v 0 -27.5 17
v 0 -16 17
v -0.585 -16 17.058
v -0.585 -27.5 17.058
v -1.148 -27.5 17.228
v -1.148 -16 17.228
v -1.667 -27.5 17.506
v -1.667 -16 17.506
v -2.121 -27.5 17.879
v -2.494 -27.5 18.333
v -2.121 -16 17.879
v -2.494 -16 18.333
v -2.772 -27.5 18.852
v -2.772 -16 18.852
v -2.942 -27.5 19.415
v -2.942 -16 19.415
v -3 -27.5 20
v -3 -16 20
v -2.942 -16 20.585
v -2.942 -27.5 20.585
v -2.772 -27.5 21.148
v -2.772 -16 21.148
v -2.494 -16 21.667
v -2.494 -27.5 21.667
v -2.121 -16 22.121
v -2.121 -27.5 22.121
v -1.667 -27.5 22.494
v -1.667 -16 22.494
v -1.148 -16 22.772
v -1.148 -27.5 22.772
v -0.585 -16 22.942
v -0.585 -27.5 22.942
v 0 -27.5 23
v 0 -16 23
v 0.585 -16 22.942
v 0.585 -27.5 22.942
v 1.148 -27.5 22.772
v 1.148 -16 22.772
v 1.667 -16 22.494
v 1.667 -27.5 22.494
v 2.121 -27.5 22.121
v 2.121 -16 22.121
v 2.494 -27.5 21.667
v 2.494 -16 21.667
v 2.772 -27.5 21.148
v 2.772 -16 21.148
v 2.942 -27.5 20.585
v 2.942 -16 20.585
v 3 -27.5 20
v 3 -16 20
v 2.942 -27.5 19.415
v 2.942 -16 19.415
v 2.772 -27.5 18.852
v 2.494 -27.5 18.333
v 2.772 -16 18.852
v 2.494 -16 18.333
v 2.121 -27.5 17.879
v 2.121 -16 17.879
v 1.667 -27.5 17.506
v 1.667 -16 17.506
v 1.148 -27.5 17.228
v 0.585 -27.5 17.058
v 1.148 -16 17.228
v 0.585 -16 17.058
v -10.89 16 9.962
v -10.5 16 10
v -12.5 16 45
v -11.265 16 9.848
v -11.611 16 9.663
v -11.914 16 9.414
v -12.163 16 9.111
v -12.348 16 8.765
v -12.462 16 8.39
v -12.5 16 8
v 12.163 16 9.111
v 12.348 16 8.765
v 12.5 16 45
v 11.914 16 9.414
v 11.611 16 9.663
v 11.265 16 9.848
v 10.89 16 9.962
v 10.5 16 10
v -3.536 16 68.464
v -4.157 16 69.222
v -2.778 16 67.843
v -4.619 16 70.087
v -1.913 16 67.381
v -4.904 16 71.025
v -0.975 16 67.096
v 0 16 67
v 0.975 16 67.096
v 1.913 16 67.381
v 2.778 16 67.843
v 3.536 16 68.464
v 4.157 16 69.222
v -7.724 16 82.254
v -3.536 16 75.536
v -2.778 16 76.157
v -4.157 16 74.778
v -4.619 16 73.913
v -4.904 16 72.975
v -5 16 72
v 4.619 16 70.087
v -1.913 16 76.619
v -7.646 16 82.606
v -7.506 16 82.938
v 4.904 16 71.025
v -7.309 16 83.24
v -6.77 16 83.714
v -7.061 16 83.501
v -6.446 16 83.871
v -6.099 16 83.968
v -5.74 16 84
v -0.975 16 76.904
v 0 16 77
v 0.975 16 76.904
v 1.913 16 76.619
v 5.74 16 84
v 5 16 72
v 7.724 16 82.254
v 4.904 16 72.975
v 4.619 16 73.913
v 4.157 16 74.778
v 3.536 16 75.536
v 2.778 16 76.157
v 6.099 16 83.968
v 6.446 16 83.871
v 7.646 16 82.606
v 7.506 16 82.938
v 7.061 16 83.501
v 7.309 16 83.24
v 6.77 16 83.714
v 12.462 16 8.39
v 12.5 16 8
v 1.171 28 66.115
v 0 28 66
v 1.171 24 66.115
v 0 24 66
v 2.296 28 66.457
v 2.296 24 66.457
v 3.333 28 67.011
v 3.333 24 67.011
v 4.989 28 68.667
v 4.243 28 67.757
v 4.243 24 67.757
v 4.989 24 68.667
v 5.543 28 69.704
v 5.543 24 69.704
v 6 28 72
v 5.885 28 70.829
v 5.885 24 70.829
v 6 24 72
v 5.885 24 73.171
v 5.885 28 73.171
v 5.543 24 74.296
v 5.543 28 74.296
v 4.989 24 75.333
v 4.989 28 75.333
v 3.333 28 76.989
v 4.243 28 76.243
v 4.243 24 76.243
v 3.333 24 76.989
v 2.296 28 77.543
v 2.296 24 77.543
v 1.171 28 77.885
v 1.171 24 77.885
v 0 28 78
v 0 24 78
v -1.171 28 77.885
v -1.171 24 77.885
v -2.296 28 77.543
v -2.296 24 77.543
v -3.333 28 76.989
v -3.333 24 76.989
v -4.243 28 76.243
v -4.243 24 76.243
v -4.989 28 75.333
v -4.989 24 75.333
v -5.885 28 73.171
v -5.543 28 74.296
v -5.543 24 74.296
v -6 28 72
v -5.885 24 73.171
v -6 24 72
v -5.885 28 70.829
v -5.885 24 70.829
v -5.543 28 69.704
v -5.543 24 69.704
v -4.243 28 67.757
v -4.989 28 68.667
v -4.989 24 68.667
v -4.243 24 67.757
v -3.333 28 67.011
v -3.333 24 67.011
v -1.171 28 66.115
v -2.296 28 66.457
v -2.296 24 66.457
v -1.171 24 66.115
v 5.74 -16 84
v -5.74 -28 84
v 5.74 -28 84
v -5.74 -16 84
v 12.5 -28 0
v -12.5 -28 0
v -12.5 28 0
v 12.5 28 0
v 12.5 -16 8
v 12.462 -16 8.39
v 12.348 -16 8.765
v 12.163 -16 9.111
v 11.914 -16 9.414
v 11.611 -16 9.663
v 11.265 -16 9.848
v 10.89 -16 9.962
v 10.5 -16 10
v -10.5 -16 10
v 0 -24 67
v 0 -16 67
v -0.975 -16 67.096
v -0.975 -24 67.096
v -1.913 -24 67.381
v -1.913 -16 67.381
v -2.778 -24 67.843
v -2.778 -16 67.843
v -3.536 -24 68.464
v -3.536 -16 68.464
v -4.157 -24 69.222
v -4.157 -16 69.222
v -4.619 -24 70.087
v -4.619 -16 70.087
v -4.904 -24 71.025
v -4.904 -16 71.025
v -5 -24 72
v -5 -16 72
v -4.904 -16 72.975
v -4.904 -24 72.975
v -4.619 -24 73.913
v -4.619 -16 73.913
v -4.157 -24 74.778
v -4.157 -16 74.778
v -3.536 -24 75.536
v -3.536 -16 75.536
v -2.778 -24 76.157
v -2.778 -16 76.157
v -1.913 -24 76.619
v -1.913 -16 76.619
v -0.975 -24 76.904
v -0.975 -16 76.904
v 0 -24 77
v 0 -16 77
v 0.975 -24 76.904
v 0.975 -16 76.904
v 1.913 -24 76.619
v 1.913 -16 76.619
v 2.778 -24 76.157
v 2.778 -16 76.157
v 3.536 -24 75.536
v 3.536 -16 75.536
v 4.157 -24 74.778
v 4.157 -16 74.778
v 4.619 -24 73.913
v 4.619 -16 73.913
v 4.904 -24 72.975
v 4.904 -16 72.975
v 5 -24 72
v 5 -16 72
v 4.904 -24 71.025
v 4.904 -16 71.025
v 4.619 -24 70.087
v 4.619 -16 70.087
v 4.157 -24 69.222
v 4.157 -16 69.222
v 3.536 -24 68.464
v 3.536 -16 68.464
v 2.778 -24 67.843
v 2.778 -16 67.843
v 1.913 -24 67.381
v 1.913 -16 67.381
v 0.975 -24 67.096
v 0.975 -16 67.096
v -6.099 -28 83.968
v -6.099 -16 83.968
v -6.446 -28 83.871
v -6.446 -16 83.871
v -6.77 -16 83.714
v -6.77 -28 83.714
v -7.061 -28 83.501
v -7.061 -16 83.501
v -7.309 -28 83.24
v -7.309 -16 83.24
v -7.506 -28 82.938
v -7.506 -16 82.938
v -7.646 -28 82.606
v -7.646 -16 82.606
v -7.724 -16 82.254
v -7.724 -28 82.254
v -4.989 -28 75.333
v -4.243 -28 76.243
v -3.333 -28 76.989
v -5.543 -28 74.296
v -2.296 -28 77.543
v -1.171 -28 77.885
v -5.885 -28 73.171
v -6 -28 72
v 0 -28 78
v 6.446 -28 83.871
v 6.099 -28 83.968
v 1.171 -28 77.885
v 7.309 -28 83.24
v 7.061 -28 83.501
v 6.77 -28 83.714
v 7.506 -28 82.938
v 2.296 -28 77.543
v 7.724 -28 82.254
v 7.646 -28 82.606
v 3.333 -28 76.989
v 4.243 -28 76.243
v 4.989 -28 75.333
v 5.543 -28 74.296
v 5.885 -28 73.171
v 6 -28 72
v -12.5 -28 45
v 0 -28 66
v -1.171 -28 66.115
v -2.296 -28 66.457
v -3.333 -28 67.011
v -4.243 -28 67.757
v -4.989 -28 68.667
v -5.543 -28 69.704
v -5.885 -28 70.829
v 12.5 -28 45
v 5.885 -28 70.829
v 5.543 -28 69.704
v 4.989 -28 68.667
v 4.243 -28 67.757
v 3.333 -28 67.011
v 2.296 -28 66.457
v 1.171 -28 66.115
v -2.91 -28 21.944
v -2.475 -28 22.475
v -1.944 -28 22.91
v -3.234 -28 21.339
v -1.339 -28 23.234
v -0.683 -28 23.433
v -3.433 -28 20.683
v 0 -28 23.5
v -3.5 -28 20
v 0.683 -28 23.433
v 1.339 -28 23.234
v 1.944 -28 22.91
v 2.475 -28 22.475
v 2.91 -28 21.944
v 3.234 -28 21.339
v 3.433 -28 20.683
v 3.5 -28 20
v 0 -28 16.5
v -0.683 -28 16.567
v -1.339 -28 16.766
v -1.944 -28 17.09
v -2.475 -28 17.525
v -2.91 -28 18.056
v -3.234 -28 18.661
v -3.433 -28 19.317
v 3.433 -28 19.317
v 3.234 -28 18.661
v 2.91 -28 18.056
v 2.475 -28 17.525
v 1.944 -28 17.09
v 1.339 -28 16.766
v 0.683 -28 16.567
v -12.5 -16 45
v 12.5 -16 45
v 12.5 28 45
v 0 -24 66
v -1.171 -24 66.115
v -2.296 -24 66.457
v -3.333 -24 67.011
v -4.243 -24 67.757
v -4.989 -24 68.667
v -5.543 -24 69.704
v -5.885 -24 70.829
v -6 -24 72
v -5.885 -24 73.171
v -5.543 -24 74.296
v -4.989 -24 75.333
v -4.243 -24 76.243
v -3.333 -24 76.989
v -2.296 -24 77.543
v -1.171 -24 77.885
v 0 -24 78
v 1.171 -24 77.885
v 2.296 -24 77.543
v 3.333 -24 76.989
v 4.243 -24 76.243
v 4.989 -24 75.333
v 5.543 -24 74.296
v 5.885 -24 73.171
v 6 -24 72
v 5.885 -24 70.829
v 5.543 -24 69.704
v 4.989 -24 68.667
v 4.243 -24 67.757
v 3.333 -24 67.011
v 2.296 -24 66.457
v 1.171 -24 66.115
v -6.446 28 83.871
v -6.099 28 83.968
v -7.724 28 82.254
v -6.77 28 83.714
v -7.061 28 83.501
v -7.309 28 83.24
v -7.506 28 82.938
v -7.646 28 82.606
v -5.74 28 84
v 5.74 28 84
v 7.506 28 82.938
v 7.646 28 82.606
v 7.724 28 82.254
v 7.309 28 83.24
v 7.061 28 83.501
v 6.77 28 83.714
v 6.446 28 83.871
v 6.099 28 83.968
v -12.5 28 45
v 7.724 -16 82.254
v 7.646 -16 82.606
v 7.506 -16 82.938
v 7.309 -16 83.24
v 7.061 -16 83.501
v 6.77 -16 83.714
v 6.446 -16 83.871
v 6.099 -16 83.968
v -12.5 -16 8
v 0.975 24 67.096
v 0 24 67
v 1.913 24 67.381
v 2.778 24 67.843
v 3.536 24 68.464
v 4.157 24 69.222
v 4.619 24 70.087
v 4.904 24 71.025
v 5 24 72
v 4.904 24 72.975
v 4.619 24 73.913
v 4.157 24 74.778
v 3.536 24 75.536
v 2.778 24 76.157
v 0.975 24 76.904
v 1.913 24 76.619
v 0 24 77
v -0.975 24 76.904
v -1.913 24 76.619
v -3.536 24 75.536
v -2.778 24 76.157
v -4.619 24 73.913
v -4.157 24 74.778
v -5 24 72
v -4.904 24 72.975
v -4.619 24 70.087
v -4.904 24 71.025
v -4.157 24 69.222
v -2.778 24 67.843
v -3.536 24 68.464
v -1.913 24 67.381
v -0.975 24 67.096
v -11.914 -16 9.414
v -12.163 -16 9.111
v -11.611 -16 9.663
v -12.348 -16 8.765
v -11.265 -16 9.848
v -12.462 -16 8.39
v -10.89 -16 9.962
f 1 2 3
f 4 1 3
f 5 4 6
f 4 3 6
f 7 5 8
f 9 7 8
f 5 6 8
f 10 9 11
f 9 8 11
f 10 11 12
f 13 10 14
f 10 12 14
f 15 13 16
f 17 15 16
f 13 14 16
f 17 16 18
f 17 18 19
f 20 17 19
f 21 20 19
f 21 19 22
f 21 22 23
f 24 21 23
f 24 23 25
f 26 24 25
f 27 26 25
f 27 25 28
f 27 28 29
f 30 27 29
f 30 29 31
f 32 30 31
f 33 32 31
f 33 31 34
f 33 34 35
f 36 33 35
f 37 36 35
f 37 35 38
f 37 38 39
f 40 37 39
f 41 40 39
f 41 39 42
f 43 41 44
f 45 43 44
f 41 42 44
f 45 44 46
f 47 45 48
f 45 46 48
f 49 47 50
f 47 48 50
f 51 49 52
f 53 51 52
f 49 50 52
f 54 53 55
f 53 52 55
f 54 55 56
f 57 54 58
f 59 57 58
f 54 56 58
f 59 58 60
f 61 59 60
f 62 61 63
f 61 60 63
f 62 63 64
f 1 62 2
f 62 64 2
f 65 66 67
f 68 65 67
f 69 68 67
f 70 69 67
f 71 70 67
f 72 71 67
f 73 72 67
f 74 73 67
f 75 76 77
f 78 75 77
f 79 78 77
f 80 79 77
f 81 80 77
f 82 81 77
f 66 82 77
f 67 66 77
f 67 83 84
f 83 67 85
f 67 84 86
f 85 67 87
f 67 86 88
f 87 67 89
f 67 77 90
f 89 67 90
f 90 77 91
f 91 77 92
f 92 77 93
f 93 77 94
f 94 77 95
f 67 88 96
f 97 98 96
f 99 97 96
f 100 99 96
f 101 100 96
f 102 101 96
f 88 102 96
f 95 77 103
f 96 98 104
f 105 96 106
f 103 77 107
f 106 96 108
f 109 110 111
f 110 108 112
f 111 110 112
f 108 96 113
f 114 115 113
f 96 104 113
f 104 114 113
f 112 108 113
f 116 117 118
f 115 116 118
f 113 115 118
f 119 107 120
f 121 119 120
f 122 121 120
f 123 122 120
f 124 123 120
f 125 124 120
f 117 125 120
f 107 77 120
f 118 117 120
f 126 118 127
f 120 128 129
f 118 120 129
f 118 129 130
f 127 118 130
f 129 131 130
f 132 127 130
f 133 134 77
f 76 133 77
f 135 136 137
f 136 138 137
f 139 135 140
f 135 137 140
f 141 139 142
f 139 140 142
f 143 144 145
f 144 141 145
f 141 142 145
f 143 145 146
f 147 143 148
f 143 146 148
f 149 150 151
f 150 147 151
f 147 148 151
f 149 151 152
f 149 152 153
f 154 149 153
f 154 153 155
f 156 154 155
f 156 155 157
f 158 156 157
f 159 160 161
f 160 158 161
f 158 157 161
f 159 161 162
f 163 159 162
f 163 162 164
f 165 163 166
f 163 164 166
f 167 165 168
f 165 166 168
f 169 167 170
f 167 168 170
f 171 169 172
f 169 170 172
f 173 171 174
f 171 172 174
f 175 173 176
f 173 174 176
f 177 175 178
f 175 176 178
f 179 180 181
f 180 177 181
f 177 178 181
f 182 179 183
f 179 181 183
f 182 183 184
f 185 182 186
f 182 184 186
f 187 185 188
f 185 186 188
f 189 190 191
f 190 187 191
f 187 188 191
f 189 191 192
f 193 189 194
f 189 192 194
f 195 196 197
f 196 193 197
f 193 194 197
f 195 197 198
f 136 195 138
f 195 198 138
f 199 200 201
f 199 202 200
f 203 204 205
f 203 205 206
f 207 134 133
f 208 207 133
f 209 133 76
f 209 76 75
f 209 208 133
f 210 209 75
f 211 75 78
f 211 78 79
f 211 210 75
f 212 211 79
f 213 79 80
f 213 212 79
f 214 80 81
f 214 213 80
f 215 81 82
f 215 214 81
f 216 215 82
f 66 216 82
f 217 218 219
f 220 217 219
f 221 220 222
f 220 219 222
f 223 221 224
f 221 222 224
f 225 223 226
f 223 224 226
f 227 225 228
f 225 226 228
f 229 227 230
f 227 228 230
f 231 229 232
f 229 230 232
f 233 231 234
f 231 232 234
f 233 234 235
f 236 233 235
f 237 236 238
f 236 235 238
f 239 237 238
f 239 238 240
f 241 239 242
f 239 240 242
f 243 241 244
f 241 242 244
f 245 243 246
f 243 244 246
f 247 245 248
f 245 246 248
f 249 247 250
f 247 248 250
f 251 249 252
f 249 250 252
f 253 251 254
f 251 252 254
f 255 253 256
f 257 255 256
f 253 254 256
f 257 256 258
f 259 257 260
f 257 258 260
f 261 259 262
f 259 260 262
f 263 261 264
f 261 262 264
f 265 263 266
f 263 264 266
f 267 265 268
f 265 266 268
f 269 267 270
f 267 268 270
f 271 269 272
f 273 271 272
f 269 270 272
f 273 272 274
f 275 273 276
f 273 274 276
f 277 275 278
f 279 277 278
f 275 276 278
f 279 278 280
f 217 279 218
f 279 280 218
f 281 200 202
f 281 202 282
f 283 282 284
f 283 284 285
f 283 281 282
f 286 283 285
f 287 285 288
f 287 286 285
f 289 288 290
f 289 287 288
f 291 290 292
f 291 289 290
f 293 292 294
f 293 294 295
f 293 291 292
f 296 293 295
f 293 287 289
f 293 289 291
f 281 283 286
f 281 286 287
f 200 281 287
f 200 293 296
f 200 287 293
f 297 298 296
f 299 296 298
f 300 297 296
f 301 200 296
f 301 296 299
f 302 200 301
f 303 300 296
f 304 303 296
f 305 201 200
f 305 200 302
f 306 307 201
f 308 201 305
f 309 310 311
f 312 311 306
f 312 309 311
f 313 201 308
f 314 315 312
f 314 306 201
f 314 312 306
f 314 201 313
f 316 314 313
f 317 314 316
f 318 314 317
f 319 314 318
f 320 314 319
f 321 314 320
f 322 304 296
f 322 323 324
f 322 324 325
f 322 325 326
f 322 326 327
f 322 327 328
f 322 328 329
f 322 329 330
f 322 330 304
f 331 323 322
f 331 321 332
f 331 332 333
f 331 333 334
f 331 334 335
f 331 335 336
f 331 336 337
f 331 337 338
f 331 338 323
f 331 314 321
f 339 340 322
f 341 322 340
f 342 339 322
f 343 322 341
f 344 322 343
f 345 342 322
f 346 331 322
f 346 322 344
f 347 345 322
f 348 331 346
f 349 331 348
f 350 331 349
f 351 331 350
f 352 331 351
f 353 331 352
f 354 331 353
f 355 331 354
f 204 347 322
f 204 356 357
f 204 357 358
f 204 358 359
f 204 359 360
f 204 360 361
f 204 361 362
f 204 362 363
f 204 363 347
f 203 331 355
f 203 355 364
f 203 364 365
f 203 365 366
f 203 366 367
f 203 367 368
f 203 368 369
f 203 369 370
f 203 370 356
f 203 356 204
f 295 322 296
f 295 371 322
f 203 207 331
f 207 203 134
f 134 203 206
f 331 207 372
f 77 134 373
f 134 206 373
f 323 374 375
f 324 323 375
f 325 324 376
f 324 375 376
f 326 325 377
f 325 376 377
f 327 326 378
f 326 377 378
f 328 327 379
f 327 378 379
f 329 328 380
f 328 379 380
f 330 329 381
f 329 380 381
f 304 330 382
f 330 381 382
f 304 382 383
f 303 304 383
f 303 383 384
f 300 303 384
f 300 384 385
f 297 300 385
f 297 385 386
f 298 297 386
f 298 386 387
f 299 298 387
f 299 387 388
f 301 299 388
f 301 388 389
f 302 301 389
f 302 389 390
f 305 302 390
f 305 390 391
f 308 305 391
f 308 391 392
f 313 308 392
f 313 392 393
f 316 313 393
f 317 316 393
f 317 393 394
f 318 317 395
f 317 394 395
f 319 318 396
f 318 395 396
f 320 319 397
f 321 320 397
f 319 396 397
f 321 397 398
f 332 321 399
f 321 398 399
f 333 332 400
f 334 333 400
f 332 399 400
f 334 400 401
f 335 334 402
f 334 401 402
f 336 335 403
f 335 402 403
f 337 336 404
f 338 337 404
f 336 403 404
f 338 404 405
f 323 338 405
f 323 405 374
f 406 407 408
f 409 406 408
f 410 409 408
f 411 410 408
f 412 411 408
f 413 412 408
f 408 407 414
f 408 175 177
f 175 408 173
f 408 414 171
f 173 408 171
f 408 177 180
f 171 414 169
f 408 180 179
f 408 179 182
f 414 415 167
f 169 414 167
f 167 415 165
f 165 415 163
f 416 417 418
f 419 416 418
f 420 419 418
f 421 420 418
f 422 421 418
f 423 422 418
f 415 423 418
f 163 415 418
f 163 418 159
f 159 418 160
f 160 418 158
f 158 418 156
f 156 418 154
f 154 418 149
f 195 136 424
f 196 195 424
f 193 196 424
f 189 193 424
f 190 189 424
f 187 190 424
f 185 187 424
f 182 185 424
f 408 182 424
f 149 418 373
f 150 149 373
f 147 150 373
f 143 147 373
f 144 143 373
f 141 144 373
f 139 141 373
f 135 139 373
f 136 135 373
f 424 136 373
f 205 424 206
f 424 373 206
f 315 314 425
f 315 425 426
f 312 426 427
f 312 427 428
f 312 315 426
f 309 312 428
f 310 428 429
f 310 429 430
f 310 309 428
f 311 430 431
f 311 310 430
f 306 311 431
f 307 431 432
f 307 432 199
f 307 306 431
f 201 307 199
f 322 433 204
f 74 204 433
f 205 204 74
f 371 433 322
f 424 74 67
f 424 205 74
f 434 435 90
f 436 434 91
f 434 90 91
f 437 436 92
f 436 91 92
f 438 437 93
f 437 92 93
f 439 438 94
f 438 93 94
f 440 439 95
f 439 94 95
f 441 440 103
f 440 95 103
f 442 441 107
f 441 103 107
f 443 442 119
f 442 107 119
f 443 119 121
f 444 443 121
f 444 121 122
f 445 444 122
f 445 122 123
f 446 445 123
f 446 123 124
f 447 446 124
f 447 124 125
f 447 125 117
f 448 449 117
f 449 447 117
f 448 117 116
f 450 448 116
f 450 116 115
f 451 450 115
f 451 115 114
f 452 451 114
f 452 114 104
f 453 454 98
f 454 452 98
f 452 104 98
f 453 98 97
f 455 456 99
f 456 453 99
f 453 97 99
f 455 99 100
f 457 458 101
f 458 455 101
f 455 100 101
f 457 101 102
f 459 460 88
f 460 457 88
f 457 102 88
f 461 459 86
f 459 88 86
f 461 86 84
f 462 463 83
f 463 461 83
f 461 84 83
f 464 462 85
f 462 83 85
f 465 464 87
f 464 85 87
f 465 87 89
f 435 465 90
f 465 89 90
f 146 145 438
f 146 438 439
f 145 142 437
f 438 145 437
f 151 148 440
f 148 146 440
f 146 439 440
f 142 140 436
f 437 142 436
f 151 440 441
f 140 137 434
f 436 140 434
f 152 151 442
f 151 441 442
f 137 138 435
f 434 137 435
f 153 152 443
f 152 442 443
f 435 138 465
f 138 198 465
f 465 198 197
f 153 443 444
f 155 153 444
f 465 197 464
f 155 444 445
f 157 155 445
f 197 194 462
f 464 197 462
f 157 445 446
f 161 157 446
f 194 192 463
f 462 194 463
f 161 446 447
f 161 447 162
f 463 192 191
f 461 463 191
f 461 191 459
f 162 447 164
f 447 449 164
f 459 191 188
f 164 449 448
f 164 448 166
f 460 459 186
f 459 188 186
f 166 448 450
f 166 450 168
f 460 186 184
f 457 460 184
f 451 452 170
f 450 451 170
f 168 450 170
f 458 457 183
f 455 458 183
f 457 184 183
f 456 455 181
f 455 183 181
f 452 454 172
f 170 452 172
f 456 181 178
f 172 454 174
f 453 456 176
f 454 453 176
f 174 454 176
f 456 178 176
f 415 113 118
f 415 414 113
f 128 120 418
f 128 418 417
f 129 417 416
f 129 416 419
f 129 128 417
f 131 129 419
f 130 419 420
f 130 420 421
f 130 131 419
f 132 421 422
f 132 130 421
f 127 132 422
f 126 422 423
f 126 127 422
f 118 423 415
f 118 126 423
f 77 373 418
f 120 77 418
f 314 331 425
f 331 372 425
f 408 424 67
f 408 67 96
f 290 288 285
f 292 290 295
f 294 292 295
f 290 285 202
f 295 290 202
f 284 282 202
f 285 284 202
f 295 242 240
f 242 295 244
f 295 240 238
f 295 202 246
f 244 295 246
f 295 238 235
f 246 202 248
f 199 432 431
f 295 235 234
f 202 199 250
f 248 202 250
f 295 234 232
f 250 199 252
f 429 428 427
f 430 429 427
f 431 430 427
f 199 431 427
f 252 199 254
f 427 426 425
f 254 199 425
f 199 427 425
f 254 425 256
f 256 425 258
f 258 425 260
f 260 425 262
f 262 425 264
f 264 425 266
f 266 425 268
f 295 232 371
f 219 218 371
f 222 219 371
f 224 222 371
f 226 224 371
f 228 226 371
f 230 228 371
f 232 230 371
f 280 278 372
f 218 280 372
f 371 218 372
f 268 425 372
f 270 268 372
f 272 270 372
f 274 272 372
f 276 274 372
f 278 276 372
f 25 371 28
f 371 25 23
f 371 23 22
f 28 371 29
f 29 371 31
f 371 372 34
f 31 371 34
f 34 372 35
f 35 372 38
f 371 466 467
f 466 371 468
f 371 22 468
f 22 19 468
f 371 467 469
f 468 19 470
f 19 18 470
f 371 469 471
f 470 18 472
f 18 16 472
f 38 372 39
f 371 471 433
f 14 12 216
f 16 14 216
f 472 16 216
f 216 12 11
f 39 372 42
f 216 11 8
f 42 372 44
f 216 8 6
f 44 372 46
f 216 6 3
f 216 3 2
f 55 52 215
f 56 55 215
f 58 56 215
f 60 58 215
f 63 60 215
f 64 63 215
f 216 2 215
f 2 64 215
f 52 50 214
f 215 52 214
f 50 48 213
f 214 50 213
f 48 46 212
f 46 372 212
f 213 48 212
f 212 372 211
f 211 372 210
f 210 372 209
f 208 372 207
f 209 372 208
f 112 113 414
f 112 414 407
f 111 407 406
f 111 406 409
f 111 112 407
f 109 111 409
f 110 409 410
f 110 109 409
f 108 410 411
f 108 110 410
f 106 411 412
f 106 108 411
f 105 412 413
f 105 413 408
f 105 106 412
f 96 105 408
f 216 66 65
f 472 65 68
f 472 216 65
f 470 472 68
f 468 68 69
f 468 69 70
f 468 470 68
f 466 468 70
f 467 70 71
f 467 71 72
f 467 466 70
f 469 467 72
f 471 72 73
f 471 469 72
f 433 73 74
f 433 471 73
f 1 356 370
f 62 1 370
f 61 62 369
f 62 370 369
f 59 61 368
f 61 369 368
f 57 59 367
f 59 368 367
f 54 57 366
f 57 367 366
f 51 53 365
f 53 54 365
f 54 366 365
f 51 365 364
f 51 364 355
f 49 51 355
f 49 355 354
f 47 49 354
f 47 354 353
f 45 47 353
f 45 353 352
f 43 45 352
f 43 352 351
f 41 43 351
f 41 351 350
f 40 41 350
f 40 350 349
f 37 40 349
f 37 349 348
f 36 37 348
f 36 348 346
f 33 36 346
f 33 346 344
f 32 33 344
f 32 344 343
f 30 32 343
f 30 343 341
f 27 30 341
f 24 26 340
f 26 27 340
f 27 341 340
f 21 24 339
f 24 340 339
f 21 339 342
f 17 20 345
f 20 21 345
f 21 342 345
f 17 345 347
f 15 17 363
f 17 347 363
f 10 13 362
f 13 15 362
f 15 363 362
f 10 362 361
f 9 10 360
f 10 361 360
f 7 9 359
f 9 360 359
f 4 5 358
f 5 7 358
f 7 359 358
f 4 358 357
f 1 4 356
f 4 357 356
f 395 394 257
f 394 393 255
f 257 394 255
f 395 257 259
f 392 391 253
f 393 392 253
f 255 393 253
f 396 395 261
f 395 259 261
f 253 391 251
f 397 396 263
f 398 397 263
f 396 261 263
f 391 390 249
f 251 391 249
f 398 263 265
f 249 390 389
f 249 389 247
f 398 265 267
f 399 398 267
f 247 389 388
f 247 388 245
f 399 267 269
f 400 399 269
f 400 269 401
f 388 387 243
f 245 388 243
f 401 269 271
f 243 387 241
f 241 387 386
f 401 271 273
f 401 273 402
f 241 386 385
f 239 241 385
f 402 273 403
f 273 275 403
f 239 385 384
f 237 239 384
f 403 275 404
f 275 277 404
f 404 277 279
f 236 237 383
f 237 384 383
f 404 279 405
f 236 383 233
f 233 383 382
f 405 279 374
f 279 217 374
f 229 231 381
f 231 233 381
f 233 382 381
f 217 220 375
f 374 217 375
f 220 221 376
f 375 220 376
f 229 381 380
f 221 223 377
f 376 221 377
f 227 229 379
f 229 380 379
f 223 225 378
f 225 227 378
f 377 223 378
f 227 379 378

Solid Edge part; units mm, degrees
sketch "Sketch1" plane through (0, 0, 0) normal (0, -1, 0) x (1, 0, 0)
  line L0 (12.5, 45) -> (7.5, 84)
  line L1 (0, 84) -> (7.5, 84)
  line L2 (0, 84) -> (-7.5, 84)
  line L3 (-12.5, 45) -> (-7.5, 84)
  line L4 (-12.5, 0) -> (-12.5, 45)
  line L5 (0, 0) -> (-12.5, 0)
  line L6 (0, 0) -> (12.5, 0)
  line L7 (12.5, 0) -> (12.5, 45)
extrude "Protrusion1" add sketch "Sketch1" along normal mid plane 56
sketch "Sketch2" plane through (12.5, 0, 22.5) normal (1, 0, 0) x (0, 1, 0)
  line L0 (16, 61.5) -> (-16, 61.5)
  line L1 (-16, 61.5) -> (-16, -12.5)
  line L2 (-16, -12.5) -> (0, -12.5)
  line L3 (0, -12.5) -> (16, -12.5)
  line L4 (16, -12.5) -> (16, 61.5)
extrude "ExtrudedCutout_1" cut sketch "Sketch2" against normal blind 71.0671
fillet "Round_1" radius 2 6 edges at (7.5, -22, 84) (-7.5, -22, 84) (7.5, 22, 84) (-7.5, 22, 84) (12.5, 0, 10) (-12.5, 0, 10)
hole "Hole_1" at (0, -28, 72) direction (0, 1, 0) diameter 10 depth 20 tip angle 118 counterbore diameter 12 counterbore depth 4
mirror "Mirror1" about plane through (0, 0, 0) normal (0, -1, 0) of "Hole_1"
hole "Hole_3" at (0, -28, 20) direction (0, 1, 0) diameter 6 depth 27 tip angle 118 countersink diameter 7 countersink angle 90
cosmetic_thread "Thread1" size "M6"
